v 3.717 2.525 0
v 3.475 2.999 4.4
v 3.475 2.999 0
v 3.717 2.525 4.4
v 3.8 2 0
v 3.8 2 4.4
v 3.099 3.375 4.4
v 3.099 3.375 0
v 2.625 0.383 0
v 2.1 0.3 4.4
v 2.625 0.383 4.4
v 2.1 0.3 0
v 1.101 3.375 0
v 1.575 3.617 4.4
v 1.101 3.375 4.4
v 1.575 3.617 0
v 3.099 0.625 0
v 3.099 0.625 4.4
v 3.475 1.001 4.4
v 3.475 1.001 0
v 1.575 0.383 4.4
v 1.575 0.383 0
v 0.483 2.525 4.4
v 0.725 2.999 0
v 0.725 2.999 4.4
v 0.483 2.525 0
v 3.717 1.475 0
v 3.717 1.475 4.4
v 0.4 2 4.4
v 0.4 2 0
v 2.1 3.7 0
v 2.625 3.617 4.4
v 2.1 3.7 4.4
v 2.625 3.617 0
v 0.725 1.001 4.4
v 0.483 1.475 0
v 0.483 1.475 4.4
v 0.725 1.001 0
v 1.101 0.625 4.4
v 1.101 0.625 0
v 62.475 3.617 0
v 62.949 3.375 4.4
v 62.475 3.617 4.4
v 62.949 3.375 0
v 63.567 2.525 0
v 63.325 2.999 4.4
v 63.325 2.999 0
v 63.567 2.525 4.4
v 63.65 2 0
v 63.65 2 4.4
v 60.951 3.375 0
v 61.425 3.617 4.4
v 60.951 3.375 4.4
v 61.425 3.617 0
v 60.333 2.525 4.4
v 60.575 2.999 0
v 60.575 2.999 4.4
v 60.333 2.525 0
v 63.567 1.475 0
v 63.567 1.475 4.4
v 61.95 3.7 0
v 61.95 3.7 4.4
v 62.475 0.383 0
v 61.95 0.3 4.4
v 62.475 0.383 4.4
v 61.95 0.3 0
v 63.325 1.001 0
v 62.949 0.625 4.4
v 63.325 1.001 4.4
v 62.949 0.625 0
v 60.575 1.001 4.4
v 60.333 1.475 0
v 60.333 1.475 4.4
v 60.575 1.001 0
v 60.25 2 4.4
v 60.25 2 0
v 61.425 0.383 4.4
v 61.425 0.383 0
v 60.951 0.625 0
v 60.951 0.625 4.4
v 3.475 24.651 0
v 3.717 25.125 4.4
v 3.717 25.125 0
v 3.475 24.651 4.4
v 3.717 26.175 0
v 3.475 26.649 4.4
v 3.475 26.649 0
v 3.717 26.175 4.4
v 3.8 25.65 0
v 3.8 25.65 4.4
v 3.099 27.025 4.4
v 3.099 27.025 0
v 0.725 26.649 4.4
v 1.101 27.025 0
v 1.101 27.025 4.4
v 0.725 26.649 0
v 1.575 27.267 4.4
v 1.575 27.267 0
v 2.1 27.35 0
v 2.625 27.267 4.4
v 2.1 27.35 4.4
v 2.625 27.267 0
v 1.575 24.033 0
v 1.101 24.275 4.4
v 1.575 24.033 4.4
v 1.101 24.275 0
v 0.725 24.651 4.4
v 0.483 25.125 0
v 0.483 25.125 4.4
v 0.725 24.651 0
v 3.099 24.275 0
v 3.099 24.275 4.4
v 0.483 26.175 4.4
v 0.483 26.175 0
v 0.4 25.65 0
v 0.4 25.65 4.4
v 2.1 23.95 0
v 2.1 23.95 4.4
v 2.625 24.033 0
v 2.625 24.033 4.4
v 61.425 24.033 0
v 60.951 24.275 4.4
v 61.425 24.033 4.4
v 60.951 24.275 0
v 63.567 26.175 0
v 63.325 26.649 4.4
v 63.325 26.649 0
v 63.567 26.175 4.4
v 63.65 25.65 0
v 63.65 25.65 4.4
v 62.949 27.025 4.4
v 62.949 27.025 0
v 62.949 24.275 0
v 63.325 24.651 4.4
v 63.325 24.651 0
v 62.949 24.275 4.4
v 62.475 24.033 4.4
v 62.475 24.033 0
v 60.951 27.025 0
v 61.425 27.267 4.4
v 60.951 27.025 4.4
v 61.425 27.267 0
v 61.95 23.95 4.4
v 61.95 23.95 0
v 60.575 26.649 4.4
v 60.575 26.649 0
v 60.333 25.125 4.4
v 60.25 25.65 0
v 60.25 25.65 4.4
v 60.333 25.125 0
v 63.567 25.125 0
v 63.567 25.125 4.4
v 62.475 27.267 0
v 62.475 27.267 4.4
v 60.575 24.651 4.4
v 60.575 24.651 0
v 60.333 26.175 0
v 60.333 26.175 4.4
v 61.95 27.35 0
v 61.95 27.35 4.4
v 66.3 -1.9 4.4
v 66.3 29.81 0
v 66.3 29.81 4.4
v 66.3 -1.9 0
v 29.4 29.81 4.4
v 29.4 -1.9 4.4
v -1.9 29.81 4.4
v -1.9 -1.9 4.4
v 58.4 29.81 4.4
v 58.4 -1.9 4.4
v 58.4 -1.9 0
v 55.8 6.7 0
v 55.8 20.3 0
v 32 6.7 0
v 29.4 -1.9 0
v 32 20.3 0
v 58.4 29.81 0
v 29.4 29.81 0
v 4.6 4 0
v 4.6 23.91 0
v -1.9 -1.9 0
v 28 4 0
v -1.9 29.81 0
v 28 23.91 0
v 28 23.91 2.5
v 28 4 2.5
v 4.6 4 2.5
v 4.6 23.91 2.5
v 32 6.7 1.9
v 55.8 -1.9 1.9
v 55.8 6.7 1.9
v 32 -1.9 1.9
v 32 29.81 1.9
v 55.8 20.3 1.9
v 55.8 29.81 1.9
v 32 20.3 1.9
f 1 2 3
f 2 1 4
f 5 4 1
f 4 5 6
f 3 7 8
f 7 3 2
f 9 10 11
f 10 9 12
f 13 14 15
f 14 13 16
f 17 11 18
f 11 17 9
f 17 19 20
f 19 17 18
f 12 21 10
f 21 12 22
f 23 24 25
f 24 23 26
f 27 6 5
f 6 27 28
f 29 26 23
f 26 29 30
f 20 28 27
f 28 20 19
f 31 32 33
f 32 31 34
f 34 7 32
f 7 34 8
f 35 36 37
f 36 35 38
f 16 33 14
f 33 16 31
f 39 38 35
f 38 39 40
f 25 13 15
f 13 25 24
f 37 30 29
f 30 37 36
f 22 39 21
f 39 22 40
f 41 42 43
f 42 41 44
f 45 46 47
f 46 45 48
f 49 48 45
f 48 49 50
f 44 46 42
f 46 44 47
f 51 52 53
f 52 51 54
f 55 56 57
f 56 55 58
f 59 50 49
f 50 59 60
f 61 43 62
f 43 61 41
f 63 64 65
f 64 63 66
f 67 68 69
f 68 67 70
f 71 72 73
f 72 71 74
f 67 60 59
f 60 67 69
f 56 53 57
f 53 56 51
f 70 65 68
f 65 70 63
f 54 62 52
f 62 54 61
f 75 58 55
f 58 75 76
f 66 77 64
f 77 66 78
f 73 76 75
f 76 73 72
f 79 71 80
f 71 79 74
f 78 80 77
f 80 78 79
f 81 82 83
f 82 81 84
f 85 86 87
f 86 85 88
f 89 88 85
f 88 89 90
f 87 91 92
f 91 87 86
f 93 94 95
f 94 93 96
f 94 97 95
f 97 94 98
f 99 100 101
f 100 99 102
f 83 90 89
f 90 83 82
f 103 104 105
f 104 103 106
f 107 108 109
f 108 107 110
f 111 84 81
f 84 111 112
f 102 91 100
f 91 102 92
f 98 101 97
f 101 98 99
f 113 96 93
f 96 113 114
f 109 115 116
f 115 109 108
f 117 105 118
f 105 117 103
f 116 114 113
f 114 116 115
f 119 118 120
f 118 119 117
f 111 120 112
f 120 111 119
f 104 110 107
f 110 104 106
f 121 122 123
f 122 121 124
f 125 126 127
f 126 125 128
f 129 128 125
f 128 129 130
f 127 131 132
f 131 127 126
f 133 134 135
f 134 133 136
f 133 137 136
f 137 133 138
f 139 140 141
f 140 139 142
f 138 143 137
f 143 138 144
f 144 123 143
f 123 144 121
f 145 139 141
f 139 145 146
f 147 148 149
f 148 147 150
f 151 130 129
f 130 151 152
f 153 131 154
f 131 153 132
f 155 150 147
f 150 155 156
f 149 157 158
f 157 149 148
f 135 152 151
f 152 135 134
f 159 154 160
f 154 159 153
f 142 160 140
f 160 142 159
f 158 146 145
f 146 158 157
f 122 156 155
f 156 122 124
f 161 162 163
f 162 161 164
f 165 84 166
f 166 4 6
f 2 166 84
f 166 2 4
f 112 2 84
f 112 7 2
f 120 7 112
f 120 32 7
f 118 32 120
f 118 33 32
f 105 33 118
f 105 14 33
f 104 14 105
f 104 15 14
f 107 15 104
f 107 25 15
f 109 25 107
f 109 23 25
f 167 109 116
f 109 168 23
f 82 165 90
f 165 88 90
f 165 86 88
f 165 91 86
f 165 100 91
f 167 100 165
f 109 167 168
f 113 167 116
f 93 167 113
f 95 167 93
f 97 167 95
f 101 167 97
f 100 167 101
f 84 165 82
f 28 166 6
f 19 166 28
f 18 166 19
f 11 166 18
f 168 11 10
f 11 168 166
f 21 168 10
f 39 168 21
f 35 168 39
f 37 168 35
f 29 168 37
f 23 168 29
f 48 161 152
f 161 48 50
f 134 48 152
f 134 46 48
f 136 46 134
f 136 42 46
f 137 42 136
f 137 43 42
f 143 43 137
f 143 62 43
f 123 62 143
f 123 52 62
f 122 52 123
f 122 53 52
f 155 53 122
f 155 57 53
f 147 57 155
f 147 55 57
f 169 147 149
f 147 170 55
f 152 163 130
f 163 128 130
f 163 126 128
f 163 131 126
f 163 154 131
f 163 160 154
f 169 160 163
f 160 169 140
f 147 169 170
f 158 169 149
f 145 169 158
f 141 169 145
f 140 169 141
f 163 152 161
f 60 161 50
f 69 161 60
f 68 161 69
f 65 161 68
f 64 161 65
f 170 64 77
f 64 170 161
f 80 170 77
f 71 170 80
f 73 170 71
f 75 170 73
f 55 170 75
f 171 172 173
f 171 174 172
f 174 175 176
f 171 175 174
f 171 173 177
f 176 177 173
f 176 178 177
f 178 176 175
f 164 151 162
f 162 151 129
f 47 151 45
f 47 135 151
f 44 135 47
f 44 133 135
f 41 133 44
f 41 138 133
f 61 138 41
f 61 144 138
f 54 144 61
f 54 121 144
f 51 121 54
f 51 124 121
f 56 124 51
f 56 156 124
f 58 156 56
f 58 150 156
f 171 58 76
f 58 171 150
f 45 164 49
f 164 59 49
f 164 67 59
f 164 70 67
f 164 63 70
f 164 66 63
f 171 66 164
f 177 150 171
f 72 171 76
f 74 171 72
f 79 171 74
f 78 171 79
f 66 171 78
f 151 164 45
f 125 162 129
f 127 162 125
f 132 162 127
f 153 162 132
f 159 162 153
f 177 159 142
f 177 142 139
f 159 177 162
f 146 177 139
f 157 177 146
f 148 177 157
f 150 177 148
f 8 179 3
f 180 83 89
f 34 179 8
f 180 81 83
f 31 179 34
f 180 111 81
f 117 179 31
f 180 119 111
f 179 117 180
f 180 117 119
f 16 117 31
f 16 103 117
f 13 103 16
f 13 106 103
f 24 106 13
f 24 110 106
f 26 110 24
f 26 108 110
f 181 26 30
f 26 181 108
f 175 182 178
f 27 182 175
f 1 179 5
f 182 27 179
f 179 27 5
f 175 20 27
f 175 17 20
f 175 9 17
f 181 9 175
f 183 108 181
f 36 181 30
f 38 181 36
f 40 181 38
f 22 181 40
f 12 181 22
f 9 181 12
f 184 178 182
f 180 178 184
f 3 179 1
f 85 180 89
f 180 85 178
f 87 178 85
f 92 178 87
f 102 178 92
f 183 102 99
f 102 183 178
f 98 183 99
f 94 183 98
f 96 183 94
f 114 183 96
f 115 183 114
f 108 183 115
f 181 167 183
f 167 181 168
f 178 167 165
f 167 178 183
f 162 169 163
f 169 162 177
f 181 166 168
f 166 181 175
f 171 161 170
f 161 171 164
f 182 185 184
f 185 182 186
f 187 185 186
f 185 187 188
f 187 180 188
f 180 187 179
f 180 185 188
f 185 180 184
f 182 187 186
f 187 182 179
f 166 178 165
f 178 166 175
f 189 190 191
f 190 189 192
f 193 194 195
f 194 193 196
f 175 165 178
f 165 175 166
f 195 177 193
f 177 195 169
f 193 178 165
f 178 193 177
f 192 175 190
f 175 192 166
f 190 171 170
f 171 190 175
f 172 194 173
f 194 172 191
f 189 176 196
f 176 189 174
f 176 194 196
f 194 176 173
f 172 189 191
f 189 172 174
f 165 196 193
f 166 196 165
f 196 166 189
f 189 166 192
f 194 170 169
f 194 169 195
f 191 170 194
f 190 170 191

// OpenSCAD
// Customizer Variables

// Distance from bottom of PCB to start of OLED hole
lcd_hole_y_offset = 8.6; // [3.0:0.1:13.0]



// Other things that I measured when designing this
pcb_width = 64.2+0.2;
pcb_depth = 27.41+0.5;

// 59.7+0.25;
post_offset_x = 59.6+0.25;
post_offset_y = 23.4+0.25;

wall_thickness = 1.9;
inside_area_depth = 2.5;

lcd_hole_width = 23.8;
lcd_hole_height = 13.6;
slope_width=2.6;
slope_height=inside_area_depth;

module make_holes() {
    post_height = 8;
    hole_radius = 1.7;
    translate([0, 0, 0]) cylinder($fn=20, r=hole_radius,h=post_height);
    translate([post_offset_x, 0, 0]) cylinder($fn=20, r=hole_radius,h=post_height);
    translate([0, post_offset_y, 0]) cylinder($fn=20, r=hole_radius,h=post_height);
    translate([post_offset_x, post_offset_y, 0]) cylinder($fn=20, r=hole_radius,h=post_height);
}


module prism(l, w, h) {
       polyhedron(points=[
               [0,0,h],           // 0    front top corner
               [0,0,0],[w,0,0],   // 1, 2 front left & right bottom corners
               [0,l,h],           // 3    back top corner
               [0,l,0],[w,l,0]    // 4, 5 back left & right bottom corners
       ], faces=[ // points for all faces must be ordered clockwise when looking in
               [0,2,1],    // top face
               [3,4,5],    // base face
               [0,1,4,3],  // h face
               [1,2,5,4],  // w face
               [0,3,5,2],  // hypotenuse face
       ]);
}

module make_LCD_carving() {
    overall_carveout_width = slope_width*2+lcd_hole_width;

    difference() {
        // The base cube
        cube([overall_carveout_width,pcb_depth+(wall_thickness*2),wall_thickness]);

        // The LCD Screen Hole (originally 8.6)
        translate([slope_width, lcd_hole_y_offset, -0.1]) cube([lcd_hole_width,lcd_hole_height,wall_thickness*2]);
    }

    // The left slope
    translate([0,0,wall_thickness]) prism(pcb_depth+wall_thickness*2,slope_width,slope_height);
    // The right slope
    translate([slope_width*2+lcd_hole_width,pcb_depth+wall_thickness*2,wall_thickness]) rotate([0,0,180]) prism(pcb_depth+wall_thickness*2,slope_width,slope_height);
}



difference () {
    // The actual outside "shell"
    translate([-wall_thickness,-wall_thickness,0]) 
        cube([pcb_width+(wall_thickness*2),
            pcb_depth+(wall_thickness * 2),
            wall_thickness+inside_area_depth]);

    // The "void" for the PCB to fit into
    translate([4.6,4,-0.1]) cube([23.4, pcb_depth-8, inside_area_depth+0.1]);

    // The screw holes
    translate([2.1,2,-1.1]) make_holes();
    
    // The LCD carving area
    translate([32-slope_width,-wall_thickness-0.1, -0.1]) cube([slope_width*2+lcd_hole_width, pcb_depth+(wall_thickness*2)+0.2, wall_thickness+inside_area_depth+0.2]);
}

translate([32-slope_width,-wall_thickness,0]) make_LCD_carving();
